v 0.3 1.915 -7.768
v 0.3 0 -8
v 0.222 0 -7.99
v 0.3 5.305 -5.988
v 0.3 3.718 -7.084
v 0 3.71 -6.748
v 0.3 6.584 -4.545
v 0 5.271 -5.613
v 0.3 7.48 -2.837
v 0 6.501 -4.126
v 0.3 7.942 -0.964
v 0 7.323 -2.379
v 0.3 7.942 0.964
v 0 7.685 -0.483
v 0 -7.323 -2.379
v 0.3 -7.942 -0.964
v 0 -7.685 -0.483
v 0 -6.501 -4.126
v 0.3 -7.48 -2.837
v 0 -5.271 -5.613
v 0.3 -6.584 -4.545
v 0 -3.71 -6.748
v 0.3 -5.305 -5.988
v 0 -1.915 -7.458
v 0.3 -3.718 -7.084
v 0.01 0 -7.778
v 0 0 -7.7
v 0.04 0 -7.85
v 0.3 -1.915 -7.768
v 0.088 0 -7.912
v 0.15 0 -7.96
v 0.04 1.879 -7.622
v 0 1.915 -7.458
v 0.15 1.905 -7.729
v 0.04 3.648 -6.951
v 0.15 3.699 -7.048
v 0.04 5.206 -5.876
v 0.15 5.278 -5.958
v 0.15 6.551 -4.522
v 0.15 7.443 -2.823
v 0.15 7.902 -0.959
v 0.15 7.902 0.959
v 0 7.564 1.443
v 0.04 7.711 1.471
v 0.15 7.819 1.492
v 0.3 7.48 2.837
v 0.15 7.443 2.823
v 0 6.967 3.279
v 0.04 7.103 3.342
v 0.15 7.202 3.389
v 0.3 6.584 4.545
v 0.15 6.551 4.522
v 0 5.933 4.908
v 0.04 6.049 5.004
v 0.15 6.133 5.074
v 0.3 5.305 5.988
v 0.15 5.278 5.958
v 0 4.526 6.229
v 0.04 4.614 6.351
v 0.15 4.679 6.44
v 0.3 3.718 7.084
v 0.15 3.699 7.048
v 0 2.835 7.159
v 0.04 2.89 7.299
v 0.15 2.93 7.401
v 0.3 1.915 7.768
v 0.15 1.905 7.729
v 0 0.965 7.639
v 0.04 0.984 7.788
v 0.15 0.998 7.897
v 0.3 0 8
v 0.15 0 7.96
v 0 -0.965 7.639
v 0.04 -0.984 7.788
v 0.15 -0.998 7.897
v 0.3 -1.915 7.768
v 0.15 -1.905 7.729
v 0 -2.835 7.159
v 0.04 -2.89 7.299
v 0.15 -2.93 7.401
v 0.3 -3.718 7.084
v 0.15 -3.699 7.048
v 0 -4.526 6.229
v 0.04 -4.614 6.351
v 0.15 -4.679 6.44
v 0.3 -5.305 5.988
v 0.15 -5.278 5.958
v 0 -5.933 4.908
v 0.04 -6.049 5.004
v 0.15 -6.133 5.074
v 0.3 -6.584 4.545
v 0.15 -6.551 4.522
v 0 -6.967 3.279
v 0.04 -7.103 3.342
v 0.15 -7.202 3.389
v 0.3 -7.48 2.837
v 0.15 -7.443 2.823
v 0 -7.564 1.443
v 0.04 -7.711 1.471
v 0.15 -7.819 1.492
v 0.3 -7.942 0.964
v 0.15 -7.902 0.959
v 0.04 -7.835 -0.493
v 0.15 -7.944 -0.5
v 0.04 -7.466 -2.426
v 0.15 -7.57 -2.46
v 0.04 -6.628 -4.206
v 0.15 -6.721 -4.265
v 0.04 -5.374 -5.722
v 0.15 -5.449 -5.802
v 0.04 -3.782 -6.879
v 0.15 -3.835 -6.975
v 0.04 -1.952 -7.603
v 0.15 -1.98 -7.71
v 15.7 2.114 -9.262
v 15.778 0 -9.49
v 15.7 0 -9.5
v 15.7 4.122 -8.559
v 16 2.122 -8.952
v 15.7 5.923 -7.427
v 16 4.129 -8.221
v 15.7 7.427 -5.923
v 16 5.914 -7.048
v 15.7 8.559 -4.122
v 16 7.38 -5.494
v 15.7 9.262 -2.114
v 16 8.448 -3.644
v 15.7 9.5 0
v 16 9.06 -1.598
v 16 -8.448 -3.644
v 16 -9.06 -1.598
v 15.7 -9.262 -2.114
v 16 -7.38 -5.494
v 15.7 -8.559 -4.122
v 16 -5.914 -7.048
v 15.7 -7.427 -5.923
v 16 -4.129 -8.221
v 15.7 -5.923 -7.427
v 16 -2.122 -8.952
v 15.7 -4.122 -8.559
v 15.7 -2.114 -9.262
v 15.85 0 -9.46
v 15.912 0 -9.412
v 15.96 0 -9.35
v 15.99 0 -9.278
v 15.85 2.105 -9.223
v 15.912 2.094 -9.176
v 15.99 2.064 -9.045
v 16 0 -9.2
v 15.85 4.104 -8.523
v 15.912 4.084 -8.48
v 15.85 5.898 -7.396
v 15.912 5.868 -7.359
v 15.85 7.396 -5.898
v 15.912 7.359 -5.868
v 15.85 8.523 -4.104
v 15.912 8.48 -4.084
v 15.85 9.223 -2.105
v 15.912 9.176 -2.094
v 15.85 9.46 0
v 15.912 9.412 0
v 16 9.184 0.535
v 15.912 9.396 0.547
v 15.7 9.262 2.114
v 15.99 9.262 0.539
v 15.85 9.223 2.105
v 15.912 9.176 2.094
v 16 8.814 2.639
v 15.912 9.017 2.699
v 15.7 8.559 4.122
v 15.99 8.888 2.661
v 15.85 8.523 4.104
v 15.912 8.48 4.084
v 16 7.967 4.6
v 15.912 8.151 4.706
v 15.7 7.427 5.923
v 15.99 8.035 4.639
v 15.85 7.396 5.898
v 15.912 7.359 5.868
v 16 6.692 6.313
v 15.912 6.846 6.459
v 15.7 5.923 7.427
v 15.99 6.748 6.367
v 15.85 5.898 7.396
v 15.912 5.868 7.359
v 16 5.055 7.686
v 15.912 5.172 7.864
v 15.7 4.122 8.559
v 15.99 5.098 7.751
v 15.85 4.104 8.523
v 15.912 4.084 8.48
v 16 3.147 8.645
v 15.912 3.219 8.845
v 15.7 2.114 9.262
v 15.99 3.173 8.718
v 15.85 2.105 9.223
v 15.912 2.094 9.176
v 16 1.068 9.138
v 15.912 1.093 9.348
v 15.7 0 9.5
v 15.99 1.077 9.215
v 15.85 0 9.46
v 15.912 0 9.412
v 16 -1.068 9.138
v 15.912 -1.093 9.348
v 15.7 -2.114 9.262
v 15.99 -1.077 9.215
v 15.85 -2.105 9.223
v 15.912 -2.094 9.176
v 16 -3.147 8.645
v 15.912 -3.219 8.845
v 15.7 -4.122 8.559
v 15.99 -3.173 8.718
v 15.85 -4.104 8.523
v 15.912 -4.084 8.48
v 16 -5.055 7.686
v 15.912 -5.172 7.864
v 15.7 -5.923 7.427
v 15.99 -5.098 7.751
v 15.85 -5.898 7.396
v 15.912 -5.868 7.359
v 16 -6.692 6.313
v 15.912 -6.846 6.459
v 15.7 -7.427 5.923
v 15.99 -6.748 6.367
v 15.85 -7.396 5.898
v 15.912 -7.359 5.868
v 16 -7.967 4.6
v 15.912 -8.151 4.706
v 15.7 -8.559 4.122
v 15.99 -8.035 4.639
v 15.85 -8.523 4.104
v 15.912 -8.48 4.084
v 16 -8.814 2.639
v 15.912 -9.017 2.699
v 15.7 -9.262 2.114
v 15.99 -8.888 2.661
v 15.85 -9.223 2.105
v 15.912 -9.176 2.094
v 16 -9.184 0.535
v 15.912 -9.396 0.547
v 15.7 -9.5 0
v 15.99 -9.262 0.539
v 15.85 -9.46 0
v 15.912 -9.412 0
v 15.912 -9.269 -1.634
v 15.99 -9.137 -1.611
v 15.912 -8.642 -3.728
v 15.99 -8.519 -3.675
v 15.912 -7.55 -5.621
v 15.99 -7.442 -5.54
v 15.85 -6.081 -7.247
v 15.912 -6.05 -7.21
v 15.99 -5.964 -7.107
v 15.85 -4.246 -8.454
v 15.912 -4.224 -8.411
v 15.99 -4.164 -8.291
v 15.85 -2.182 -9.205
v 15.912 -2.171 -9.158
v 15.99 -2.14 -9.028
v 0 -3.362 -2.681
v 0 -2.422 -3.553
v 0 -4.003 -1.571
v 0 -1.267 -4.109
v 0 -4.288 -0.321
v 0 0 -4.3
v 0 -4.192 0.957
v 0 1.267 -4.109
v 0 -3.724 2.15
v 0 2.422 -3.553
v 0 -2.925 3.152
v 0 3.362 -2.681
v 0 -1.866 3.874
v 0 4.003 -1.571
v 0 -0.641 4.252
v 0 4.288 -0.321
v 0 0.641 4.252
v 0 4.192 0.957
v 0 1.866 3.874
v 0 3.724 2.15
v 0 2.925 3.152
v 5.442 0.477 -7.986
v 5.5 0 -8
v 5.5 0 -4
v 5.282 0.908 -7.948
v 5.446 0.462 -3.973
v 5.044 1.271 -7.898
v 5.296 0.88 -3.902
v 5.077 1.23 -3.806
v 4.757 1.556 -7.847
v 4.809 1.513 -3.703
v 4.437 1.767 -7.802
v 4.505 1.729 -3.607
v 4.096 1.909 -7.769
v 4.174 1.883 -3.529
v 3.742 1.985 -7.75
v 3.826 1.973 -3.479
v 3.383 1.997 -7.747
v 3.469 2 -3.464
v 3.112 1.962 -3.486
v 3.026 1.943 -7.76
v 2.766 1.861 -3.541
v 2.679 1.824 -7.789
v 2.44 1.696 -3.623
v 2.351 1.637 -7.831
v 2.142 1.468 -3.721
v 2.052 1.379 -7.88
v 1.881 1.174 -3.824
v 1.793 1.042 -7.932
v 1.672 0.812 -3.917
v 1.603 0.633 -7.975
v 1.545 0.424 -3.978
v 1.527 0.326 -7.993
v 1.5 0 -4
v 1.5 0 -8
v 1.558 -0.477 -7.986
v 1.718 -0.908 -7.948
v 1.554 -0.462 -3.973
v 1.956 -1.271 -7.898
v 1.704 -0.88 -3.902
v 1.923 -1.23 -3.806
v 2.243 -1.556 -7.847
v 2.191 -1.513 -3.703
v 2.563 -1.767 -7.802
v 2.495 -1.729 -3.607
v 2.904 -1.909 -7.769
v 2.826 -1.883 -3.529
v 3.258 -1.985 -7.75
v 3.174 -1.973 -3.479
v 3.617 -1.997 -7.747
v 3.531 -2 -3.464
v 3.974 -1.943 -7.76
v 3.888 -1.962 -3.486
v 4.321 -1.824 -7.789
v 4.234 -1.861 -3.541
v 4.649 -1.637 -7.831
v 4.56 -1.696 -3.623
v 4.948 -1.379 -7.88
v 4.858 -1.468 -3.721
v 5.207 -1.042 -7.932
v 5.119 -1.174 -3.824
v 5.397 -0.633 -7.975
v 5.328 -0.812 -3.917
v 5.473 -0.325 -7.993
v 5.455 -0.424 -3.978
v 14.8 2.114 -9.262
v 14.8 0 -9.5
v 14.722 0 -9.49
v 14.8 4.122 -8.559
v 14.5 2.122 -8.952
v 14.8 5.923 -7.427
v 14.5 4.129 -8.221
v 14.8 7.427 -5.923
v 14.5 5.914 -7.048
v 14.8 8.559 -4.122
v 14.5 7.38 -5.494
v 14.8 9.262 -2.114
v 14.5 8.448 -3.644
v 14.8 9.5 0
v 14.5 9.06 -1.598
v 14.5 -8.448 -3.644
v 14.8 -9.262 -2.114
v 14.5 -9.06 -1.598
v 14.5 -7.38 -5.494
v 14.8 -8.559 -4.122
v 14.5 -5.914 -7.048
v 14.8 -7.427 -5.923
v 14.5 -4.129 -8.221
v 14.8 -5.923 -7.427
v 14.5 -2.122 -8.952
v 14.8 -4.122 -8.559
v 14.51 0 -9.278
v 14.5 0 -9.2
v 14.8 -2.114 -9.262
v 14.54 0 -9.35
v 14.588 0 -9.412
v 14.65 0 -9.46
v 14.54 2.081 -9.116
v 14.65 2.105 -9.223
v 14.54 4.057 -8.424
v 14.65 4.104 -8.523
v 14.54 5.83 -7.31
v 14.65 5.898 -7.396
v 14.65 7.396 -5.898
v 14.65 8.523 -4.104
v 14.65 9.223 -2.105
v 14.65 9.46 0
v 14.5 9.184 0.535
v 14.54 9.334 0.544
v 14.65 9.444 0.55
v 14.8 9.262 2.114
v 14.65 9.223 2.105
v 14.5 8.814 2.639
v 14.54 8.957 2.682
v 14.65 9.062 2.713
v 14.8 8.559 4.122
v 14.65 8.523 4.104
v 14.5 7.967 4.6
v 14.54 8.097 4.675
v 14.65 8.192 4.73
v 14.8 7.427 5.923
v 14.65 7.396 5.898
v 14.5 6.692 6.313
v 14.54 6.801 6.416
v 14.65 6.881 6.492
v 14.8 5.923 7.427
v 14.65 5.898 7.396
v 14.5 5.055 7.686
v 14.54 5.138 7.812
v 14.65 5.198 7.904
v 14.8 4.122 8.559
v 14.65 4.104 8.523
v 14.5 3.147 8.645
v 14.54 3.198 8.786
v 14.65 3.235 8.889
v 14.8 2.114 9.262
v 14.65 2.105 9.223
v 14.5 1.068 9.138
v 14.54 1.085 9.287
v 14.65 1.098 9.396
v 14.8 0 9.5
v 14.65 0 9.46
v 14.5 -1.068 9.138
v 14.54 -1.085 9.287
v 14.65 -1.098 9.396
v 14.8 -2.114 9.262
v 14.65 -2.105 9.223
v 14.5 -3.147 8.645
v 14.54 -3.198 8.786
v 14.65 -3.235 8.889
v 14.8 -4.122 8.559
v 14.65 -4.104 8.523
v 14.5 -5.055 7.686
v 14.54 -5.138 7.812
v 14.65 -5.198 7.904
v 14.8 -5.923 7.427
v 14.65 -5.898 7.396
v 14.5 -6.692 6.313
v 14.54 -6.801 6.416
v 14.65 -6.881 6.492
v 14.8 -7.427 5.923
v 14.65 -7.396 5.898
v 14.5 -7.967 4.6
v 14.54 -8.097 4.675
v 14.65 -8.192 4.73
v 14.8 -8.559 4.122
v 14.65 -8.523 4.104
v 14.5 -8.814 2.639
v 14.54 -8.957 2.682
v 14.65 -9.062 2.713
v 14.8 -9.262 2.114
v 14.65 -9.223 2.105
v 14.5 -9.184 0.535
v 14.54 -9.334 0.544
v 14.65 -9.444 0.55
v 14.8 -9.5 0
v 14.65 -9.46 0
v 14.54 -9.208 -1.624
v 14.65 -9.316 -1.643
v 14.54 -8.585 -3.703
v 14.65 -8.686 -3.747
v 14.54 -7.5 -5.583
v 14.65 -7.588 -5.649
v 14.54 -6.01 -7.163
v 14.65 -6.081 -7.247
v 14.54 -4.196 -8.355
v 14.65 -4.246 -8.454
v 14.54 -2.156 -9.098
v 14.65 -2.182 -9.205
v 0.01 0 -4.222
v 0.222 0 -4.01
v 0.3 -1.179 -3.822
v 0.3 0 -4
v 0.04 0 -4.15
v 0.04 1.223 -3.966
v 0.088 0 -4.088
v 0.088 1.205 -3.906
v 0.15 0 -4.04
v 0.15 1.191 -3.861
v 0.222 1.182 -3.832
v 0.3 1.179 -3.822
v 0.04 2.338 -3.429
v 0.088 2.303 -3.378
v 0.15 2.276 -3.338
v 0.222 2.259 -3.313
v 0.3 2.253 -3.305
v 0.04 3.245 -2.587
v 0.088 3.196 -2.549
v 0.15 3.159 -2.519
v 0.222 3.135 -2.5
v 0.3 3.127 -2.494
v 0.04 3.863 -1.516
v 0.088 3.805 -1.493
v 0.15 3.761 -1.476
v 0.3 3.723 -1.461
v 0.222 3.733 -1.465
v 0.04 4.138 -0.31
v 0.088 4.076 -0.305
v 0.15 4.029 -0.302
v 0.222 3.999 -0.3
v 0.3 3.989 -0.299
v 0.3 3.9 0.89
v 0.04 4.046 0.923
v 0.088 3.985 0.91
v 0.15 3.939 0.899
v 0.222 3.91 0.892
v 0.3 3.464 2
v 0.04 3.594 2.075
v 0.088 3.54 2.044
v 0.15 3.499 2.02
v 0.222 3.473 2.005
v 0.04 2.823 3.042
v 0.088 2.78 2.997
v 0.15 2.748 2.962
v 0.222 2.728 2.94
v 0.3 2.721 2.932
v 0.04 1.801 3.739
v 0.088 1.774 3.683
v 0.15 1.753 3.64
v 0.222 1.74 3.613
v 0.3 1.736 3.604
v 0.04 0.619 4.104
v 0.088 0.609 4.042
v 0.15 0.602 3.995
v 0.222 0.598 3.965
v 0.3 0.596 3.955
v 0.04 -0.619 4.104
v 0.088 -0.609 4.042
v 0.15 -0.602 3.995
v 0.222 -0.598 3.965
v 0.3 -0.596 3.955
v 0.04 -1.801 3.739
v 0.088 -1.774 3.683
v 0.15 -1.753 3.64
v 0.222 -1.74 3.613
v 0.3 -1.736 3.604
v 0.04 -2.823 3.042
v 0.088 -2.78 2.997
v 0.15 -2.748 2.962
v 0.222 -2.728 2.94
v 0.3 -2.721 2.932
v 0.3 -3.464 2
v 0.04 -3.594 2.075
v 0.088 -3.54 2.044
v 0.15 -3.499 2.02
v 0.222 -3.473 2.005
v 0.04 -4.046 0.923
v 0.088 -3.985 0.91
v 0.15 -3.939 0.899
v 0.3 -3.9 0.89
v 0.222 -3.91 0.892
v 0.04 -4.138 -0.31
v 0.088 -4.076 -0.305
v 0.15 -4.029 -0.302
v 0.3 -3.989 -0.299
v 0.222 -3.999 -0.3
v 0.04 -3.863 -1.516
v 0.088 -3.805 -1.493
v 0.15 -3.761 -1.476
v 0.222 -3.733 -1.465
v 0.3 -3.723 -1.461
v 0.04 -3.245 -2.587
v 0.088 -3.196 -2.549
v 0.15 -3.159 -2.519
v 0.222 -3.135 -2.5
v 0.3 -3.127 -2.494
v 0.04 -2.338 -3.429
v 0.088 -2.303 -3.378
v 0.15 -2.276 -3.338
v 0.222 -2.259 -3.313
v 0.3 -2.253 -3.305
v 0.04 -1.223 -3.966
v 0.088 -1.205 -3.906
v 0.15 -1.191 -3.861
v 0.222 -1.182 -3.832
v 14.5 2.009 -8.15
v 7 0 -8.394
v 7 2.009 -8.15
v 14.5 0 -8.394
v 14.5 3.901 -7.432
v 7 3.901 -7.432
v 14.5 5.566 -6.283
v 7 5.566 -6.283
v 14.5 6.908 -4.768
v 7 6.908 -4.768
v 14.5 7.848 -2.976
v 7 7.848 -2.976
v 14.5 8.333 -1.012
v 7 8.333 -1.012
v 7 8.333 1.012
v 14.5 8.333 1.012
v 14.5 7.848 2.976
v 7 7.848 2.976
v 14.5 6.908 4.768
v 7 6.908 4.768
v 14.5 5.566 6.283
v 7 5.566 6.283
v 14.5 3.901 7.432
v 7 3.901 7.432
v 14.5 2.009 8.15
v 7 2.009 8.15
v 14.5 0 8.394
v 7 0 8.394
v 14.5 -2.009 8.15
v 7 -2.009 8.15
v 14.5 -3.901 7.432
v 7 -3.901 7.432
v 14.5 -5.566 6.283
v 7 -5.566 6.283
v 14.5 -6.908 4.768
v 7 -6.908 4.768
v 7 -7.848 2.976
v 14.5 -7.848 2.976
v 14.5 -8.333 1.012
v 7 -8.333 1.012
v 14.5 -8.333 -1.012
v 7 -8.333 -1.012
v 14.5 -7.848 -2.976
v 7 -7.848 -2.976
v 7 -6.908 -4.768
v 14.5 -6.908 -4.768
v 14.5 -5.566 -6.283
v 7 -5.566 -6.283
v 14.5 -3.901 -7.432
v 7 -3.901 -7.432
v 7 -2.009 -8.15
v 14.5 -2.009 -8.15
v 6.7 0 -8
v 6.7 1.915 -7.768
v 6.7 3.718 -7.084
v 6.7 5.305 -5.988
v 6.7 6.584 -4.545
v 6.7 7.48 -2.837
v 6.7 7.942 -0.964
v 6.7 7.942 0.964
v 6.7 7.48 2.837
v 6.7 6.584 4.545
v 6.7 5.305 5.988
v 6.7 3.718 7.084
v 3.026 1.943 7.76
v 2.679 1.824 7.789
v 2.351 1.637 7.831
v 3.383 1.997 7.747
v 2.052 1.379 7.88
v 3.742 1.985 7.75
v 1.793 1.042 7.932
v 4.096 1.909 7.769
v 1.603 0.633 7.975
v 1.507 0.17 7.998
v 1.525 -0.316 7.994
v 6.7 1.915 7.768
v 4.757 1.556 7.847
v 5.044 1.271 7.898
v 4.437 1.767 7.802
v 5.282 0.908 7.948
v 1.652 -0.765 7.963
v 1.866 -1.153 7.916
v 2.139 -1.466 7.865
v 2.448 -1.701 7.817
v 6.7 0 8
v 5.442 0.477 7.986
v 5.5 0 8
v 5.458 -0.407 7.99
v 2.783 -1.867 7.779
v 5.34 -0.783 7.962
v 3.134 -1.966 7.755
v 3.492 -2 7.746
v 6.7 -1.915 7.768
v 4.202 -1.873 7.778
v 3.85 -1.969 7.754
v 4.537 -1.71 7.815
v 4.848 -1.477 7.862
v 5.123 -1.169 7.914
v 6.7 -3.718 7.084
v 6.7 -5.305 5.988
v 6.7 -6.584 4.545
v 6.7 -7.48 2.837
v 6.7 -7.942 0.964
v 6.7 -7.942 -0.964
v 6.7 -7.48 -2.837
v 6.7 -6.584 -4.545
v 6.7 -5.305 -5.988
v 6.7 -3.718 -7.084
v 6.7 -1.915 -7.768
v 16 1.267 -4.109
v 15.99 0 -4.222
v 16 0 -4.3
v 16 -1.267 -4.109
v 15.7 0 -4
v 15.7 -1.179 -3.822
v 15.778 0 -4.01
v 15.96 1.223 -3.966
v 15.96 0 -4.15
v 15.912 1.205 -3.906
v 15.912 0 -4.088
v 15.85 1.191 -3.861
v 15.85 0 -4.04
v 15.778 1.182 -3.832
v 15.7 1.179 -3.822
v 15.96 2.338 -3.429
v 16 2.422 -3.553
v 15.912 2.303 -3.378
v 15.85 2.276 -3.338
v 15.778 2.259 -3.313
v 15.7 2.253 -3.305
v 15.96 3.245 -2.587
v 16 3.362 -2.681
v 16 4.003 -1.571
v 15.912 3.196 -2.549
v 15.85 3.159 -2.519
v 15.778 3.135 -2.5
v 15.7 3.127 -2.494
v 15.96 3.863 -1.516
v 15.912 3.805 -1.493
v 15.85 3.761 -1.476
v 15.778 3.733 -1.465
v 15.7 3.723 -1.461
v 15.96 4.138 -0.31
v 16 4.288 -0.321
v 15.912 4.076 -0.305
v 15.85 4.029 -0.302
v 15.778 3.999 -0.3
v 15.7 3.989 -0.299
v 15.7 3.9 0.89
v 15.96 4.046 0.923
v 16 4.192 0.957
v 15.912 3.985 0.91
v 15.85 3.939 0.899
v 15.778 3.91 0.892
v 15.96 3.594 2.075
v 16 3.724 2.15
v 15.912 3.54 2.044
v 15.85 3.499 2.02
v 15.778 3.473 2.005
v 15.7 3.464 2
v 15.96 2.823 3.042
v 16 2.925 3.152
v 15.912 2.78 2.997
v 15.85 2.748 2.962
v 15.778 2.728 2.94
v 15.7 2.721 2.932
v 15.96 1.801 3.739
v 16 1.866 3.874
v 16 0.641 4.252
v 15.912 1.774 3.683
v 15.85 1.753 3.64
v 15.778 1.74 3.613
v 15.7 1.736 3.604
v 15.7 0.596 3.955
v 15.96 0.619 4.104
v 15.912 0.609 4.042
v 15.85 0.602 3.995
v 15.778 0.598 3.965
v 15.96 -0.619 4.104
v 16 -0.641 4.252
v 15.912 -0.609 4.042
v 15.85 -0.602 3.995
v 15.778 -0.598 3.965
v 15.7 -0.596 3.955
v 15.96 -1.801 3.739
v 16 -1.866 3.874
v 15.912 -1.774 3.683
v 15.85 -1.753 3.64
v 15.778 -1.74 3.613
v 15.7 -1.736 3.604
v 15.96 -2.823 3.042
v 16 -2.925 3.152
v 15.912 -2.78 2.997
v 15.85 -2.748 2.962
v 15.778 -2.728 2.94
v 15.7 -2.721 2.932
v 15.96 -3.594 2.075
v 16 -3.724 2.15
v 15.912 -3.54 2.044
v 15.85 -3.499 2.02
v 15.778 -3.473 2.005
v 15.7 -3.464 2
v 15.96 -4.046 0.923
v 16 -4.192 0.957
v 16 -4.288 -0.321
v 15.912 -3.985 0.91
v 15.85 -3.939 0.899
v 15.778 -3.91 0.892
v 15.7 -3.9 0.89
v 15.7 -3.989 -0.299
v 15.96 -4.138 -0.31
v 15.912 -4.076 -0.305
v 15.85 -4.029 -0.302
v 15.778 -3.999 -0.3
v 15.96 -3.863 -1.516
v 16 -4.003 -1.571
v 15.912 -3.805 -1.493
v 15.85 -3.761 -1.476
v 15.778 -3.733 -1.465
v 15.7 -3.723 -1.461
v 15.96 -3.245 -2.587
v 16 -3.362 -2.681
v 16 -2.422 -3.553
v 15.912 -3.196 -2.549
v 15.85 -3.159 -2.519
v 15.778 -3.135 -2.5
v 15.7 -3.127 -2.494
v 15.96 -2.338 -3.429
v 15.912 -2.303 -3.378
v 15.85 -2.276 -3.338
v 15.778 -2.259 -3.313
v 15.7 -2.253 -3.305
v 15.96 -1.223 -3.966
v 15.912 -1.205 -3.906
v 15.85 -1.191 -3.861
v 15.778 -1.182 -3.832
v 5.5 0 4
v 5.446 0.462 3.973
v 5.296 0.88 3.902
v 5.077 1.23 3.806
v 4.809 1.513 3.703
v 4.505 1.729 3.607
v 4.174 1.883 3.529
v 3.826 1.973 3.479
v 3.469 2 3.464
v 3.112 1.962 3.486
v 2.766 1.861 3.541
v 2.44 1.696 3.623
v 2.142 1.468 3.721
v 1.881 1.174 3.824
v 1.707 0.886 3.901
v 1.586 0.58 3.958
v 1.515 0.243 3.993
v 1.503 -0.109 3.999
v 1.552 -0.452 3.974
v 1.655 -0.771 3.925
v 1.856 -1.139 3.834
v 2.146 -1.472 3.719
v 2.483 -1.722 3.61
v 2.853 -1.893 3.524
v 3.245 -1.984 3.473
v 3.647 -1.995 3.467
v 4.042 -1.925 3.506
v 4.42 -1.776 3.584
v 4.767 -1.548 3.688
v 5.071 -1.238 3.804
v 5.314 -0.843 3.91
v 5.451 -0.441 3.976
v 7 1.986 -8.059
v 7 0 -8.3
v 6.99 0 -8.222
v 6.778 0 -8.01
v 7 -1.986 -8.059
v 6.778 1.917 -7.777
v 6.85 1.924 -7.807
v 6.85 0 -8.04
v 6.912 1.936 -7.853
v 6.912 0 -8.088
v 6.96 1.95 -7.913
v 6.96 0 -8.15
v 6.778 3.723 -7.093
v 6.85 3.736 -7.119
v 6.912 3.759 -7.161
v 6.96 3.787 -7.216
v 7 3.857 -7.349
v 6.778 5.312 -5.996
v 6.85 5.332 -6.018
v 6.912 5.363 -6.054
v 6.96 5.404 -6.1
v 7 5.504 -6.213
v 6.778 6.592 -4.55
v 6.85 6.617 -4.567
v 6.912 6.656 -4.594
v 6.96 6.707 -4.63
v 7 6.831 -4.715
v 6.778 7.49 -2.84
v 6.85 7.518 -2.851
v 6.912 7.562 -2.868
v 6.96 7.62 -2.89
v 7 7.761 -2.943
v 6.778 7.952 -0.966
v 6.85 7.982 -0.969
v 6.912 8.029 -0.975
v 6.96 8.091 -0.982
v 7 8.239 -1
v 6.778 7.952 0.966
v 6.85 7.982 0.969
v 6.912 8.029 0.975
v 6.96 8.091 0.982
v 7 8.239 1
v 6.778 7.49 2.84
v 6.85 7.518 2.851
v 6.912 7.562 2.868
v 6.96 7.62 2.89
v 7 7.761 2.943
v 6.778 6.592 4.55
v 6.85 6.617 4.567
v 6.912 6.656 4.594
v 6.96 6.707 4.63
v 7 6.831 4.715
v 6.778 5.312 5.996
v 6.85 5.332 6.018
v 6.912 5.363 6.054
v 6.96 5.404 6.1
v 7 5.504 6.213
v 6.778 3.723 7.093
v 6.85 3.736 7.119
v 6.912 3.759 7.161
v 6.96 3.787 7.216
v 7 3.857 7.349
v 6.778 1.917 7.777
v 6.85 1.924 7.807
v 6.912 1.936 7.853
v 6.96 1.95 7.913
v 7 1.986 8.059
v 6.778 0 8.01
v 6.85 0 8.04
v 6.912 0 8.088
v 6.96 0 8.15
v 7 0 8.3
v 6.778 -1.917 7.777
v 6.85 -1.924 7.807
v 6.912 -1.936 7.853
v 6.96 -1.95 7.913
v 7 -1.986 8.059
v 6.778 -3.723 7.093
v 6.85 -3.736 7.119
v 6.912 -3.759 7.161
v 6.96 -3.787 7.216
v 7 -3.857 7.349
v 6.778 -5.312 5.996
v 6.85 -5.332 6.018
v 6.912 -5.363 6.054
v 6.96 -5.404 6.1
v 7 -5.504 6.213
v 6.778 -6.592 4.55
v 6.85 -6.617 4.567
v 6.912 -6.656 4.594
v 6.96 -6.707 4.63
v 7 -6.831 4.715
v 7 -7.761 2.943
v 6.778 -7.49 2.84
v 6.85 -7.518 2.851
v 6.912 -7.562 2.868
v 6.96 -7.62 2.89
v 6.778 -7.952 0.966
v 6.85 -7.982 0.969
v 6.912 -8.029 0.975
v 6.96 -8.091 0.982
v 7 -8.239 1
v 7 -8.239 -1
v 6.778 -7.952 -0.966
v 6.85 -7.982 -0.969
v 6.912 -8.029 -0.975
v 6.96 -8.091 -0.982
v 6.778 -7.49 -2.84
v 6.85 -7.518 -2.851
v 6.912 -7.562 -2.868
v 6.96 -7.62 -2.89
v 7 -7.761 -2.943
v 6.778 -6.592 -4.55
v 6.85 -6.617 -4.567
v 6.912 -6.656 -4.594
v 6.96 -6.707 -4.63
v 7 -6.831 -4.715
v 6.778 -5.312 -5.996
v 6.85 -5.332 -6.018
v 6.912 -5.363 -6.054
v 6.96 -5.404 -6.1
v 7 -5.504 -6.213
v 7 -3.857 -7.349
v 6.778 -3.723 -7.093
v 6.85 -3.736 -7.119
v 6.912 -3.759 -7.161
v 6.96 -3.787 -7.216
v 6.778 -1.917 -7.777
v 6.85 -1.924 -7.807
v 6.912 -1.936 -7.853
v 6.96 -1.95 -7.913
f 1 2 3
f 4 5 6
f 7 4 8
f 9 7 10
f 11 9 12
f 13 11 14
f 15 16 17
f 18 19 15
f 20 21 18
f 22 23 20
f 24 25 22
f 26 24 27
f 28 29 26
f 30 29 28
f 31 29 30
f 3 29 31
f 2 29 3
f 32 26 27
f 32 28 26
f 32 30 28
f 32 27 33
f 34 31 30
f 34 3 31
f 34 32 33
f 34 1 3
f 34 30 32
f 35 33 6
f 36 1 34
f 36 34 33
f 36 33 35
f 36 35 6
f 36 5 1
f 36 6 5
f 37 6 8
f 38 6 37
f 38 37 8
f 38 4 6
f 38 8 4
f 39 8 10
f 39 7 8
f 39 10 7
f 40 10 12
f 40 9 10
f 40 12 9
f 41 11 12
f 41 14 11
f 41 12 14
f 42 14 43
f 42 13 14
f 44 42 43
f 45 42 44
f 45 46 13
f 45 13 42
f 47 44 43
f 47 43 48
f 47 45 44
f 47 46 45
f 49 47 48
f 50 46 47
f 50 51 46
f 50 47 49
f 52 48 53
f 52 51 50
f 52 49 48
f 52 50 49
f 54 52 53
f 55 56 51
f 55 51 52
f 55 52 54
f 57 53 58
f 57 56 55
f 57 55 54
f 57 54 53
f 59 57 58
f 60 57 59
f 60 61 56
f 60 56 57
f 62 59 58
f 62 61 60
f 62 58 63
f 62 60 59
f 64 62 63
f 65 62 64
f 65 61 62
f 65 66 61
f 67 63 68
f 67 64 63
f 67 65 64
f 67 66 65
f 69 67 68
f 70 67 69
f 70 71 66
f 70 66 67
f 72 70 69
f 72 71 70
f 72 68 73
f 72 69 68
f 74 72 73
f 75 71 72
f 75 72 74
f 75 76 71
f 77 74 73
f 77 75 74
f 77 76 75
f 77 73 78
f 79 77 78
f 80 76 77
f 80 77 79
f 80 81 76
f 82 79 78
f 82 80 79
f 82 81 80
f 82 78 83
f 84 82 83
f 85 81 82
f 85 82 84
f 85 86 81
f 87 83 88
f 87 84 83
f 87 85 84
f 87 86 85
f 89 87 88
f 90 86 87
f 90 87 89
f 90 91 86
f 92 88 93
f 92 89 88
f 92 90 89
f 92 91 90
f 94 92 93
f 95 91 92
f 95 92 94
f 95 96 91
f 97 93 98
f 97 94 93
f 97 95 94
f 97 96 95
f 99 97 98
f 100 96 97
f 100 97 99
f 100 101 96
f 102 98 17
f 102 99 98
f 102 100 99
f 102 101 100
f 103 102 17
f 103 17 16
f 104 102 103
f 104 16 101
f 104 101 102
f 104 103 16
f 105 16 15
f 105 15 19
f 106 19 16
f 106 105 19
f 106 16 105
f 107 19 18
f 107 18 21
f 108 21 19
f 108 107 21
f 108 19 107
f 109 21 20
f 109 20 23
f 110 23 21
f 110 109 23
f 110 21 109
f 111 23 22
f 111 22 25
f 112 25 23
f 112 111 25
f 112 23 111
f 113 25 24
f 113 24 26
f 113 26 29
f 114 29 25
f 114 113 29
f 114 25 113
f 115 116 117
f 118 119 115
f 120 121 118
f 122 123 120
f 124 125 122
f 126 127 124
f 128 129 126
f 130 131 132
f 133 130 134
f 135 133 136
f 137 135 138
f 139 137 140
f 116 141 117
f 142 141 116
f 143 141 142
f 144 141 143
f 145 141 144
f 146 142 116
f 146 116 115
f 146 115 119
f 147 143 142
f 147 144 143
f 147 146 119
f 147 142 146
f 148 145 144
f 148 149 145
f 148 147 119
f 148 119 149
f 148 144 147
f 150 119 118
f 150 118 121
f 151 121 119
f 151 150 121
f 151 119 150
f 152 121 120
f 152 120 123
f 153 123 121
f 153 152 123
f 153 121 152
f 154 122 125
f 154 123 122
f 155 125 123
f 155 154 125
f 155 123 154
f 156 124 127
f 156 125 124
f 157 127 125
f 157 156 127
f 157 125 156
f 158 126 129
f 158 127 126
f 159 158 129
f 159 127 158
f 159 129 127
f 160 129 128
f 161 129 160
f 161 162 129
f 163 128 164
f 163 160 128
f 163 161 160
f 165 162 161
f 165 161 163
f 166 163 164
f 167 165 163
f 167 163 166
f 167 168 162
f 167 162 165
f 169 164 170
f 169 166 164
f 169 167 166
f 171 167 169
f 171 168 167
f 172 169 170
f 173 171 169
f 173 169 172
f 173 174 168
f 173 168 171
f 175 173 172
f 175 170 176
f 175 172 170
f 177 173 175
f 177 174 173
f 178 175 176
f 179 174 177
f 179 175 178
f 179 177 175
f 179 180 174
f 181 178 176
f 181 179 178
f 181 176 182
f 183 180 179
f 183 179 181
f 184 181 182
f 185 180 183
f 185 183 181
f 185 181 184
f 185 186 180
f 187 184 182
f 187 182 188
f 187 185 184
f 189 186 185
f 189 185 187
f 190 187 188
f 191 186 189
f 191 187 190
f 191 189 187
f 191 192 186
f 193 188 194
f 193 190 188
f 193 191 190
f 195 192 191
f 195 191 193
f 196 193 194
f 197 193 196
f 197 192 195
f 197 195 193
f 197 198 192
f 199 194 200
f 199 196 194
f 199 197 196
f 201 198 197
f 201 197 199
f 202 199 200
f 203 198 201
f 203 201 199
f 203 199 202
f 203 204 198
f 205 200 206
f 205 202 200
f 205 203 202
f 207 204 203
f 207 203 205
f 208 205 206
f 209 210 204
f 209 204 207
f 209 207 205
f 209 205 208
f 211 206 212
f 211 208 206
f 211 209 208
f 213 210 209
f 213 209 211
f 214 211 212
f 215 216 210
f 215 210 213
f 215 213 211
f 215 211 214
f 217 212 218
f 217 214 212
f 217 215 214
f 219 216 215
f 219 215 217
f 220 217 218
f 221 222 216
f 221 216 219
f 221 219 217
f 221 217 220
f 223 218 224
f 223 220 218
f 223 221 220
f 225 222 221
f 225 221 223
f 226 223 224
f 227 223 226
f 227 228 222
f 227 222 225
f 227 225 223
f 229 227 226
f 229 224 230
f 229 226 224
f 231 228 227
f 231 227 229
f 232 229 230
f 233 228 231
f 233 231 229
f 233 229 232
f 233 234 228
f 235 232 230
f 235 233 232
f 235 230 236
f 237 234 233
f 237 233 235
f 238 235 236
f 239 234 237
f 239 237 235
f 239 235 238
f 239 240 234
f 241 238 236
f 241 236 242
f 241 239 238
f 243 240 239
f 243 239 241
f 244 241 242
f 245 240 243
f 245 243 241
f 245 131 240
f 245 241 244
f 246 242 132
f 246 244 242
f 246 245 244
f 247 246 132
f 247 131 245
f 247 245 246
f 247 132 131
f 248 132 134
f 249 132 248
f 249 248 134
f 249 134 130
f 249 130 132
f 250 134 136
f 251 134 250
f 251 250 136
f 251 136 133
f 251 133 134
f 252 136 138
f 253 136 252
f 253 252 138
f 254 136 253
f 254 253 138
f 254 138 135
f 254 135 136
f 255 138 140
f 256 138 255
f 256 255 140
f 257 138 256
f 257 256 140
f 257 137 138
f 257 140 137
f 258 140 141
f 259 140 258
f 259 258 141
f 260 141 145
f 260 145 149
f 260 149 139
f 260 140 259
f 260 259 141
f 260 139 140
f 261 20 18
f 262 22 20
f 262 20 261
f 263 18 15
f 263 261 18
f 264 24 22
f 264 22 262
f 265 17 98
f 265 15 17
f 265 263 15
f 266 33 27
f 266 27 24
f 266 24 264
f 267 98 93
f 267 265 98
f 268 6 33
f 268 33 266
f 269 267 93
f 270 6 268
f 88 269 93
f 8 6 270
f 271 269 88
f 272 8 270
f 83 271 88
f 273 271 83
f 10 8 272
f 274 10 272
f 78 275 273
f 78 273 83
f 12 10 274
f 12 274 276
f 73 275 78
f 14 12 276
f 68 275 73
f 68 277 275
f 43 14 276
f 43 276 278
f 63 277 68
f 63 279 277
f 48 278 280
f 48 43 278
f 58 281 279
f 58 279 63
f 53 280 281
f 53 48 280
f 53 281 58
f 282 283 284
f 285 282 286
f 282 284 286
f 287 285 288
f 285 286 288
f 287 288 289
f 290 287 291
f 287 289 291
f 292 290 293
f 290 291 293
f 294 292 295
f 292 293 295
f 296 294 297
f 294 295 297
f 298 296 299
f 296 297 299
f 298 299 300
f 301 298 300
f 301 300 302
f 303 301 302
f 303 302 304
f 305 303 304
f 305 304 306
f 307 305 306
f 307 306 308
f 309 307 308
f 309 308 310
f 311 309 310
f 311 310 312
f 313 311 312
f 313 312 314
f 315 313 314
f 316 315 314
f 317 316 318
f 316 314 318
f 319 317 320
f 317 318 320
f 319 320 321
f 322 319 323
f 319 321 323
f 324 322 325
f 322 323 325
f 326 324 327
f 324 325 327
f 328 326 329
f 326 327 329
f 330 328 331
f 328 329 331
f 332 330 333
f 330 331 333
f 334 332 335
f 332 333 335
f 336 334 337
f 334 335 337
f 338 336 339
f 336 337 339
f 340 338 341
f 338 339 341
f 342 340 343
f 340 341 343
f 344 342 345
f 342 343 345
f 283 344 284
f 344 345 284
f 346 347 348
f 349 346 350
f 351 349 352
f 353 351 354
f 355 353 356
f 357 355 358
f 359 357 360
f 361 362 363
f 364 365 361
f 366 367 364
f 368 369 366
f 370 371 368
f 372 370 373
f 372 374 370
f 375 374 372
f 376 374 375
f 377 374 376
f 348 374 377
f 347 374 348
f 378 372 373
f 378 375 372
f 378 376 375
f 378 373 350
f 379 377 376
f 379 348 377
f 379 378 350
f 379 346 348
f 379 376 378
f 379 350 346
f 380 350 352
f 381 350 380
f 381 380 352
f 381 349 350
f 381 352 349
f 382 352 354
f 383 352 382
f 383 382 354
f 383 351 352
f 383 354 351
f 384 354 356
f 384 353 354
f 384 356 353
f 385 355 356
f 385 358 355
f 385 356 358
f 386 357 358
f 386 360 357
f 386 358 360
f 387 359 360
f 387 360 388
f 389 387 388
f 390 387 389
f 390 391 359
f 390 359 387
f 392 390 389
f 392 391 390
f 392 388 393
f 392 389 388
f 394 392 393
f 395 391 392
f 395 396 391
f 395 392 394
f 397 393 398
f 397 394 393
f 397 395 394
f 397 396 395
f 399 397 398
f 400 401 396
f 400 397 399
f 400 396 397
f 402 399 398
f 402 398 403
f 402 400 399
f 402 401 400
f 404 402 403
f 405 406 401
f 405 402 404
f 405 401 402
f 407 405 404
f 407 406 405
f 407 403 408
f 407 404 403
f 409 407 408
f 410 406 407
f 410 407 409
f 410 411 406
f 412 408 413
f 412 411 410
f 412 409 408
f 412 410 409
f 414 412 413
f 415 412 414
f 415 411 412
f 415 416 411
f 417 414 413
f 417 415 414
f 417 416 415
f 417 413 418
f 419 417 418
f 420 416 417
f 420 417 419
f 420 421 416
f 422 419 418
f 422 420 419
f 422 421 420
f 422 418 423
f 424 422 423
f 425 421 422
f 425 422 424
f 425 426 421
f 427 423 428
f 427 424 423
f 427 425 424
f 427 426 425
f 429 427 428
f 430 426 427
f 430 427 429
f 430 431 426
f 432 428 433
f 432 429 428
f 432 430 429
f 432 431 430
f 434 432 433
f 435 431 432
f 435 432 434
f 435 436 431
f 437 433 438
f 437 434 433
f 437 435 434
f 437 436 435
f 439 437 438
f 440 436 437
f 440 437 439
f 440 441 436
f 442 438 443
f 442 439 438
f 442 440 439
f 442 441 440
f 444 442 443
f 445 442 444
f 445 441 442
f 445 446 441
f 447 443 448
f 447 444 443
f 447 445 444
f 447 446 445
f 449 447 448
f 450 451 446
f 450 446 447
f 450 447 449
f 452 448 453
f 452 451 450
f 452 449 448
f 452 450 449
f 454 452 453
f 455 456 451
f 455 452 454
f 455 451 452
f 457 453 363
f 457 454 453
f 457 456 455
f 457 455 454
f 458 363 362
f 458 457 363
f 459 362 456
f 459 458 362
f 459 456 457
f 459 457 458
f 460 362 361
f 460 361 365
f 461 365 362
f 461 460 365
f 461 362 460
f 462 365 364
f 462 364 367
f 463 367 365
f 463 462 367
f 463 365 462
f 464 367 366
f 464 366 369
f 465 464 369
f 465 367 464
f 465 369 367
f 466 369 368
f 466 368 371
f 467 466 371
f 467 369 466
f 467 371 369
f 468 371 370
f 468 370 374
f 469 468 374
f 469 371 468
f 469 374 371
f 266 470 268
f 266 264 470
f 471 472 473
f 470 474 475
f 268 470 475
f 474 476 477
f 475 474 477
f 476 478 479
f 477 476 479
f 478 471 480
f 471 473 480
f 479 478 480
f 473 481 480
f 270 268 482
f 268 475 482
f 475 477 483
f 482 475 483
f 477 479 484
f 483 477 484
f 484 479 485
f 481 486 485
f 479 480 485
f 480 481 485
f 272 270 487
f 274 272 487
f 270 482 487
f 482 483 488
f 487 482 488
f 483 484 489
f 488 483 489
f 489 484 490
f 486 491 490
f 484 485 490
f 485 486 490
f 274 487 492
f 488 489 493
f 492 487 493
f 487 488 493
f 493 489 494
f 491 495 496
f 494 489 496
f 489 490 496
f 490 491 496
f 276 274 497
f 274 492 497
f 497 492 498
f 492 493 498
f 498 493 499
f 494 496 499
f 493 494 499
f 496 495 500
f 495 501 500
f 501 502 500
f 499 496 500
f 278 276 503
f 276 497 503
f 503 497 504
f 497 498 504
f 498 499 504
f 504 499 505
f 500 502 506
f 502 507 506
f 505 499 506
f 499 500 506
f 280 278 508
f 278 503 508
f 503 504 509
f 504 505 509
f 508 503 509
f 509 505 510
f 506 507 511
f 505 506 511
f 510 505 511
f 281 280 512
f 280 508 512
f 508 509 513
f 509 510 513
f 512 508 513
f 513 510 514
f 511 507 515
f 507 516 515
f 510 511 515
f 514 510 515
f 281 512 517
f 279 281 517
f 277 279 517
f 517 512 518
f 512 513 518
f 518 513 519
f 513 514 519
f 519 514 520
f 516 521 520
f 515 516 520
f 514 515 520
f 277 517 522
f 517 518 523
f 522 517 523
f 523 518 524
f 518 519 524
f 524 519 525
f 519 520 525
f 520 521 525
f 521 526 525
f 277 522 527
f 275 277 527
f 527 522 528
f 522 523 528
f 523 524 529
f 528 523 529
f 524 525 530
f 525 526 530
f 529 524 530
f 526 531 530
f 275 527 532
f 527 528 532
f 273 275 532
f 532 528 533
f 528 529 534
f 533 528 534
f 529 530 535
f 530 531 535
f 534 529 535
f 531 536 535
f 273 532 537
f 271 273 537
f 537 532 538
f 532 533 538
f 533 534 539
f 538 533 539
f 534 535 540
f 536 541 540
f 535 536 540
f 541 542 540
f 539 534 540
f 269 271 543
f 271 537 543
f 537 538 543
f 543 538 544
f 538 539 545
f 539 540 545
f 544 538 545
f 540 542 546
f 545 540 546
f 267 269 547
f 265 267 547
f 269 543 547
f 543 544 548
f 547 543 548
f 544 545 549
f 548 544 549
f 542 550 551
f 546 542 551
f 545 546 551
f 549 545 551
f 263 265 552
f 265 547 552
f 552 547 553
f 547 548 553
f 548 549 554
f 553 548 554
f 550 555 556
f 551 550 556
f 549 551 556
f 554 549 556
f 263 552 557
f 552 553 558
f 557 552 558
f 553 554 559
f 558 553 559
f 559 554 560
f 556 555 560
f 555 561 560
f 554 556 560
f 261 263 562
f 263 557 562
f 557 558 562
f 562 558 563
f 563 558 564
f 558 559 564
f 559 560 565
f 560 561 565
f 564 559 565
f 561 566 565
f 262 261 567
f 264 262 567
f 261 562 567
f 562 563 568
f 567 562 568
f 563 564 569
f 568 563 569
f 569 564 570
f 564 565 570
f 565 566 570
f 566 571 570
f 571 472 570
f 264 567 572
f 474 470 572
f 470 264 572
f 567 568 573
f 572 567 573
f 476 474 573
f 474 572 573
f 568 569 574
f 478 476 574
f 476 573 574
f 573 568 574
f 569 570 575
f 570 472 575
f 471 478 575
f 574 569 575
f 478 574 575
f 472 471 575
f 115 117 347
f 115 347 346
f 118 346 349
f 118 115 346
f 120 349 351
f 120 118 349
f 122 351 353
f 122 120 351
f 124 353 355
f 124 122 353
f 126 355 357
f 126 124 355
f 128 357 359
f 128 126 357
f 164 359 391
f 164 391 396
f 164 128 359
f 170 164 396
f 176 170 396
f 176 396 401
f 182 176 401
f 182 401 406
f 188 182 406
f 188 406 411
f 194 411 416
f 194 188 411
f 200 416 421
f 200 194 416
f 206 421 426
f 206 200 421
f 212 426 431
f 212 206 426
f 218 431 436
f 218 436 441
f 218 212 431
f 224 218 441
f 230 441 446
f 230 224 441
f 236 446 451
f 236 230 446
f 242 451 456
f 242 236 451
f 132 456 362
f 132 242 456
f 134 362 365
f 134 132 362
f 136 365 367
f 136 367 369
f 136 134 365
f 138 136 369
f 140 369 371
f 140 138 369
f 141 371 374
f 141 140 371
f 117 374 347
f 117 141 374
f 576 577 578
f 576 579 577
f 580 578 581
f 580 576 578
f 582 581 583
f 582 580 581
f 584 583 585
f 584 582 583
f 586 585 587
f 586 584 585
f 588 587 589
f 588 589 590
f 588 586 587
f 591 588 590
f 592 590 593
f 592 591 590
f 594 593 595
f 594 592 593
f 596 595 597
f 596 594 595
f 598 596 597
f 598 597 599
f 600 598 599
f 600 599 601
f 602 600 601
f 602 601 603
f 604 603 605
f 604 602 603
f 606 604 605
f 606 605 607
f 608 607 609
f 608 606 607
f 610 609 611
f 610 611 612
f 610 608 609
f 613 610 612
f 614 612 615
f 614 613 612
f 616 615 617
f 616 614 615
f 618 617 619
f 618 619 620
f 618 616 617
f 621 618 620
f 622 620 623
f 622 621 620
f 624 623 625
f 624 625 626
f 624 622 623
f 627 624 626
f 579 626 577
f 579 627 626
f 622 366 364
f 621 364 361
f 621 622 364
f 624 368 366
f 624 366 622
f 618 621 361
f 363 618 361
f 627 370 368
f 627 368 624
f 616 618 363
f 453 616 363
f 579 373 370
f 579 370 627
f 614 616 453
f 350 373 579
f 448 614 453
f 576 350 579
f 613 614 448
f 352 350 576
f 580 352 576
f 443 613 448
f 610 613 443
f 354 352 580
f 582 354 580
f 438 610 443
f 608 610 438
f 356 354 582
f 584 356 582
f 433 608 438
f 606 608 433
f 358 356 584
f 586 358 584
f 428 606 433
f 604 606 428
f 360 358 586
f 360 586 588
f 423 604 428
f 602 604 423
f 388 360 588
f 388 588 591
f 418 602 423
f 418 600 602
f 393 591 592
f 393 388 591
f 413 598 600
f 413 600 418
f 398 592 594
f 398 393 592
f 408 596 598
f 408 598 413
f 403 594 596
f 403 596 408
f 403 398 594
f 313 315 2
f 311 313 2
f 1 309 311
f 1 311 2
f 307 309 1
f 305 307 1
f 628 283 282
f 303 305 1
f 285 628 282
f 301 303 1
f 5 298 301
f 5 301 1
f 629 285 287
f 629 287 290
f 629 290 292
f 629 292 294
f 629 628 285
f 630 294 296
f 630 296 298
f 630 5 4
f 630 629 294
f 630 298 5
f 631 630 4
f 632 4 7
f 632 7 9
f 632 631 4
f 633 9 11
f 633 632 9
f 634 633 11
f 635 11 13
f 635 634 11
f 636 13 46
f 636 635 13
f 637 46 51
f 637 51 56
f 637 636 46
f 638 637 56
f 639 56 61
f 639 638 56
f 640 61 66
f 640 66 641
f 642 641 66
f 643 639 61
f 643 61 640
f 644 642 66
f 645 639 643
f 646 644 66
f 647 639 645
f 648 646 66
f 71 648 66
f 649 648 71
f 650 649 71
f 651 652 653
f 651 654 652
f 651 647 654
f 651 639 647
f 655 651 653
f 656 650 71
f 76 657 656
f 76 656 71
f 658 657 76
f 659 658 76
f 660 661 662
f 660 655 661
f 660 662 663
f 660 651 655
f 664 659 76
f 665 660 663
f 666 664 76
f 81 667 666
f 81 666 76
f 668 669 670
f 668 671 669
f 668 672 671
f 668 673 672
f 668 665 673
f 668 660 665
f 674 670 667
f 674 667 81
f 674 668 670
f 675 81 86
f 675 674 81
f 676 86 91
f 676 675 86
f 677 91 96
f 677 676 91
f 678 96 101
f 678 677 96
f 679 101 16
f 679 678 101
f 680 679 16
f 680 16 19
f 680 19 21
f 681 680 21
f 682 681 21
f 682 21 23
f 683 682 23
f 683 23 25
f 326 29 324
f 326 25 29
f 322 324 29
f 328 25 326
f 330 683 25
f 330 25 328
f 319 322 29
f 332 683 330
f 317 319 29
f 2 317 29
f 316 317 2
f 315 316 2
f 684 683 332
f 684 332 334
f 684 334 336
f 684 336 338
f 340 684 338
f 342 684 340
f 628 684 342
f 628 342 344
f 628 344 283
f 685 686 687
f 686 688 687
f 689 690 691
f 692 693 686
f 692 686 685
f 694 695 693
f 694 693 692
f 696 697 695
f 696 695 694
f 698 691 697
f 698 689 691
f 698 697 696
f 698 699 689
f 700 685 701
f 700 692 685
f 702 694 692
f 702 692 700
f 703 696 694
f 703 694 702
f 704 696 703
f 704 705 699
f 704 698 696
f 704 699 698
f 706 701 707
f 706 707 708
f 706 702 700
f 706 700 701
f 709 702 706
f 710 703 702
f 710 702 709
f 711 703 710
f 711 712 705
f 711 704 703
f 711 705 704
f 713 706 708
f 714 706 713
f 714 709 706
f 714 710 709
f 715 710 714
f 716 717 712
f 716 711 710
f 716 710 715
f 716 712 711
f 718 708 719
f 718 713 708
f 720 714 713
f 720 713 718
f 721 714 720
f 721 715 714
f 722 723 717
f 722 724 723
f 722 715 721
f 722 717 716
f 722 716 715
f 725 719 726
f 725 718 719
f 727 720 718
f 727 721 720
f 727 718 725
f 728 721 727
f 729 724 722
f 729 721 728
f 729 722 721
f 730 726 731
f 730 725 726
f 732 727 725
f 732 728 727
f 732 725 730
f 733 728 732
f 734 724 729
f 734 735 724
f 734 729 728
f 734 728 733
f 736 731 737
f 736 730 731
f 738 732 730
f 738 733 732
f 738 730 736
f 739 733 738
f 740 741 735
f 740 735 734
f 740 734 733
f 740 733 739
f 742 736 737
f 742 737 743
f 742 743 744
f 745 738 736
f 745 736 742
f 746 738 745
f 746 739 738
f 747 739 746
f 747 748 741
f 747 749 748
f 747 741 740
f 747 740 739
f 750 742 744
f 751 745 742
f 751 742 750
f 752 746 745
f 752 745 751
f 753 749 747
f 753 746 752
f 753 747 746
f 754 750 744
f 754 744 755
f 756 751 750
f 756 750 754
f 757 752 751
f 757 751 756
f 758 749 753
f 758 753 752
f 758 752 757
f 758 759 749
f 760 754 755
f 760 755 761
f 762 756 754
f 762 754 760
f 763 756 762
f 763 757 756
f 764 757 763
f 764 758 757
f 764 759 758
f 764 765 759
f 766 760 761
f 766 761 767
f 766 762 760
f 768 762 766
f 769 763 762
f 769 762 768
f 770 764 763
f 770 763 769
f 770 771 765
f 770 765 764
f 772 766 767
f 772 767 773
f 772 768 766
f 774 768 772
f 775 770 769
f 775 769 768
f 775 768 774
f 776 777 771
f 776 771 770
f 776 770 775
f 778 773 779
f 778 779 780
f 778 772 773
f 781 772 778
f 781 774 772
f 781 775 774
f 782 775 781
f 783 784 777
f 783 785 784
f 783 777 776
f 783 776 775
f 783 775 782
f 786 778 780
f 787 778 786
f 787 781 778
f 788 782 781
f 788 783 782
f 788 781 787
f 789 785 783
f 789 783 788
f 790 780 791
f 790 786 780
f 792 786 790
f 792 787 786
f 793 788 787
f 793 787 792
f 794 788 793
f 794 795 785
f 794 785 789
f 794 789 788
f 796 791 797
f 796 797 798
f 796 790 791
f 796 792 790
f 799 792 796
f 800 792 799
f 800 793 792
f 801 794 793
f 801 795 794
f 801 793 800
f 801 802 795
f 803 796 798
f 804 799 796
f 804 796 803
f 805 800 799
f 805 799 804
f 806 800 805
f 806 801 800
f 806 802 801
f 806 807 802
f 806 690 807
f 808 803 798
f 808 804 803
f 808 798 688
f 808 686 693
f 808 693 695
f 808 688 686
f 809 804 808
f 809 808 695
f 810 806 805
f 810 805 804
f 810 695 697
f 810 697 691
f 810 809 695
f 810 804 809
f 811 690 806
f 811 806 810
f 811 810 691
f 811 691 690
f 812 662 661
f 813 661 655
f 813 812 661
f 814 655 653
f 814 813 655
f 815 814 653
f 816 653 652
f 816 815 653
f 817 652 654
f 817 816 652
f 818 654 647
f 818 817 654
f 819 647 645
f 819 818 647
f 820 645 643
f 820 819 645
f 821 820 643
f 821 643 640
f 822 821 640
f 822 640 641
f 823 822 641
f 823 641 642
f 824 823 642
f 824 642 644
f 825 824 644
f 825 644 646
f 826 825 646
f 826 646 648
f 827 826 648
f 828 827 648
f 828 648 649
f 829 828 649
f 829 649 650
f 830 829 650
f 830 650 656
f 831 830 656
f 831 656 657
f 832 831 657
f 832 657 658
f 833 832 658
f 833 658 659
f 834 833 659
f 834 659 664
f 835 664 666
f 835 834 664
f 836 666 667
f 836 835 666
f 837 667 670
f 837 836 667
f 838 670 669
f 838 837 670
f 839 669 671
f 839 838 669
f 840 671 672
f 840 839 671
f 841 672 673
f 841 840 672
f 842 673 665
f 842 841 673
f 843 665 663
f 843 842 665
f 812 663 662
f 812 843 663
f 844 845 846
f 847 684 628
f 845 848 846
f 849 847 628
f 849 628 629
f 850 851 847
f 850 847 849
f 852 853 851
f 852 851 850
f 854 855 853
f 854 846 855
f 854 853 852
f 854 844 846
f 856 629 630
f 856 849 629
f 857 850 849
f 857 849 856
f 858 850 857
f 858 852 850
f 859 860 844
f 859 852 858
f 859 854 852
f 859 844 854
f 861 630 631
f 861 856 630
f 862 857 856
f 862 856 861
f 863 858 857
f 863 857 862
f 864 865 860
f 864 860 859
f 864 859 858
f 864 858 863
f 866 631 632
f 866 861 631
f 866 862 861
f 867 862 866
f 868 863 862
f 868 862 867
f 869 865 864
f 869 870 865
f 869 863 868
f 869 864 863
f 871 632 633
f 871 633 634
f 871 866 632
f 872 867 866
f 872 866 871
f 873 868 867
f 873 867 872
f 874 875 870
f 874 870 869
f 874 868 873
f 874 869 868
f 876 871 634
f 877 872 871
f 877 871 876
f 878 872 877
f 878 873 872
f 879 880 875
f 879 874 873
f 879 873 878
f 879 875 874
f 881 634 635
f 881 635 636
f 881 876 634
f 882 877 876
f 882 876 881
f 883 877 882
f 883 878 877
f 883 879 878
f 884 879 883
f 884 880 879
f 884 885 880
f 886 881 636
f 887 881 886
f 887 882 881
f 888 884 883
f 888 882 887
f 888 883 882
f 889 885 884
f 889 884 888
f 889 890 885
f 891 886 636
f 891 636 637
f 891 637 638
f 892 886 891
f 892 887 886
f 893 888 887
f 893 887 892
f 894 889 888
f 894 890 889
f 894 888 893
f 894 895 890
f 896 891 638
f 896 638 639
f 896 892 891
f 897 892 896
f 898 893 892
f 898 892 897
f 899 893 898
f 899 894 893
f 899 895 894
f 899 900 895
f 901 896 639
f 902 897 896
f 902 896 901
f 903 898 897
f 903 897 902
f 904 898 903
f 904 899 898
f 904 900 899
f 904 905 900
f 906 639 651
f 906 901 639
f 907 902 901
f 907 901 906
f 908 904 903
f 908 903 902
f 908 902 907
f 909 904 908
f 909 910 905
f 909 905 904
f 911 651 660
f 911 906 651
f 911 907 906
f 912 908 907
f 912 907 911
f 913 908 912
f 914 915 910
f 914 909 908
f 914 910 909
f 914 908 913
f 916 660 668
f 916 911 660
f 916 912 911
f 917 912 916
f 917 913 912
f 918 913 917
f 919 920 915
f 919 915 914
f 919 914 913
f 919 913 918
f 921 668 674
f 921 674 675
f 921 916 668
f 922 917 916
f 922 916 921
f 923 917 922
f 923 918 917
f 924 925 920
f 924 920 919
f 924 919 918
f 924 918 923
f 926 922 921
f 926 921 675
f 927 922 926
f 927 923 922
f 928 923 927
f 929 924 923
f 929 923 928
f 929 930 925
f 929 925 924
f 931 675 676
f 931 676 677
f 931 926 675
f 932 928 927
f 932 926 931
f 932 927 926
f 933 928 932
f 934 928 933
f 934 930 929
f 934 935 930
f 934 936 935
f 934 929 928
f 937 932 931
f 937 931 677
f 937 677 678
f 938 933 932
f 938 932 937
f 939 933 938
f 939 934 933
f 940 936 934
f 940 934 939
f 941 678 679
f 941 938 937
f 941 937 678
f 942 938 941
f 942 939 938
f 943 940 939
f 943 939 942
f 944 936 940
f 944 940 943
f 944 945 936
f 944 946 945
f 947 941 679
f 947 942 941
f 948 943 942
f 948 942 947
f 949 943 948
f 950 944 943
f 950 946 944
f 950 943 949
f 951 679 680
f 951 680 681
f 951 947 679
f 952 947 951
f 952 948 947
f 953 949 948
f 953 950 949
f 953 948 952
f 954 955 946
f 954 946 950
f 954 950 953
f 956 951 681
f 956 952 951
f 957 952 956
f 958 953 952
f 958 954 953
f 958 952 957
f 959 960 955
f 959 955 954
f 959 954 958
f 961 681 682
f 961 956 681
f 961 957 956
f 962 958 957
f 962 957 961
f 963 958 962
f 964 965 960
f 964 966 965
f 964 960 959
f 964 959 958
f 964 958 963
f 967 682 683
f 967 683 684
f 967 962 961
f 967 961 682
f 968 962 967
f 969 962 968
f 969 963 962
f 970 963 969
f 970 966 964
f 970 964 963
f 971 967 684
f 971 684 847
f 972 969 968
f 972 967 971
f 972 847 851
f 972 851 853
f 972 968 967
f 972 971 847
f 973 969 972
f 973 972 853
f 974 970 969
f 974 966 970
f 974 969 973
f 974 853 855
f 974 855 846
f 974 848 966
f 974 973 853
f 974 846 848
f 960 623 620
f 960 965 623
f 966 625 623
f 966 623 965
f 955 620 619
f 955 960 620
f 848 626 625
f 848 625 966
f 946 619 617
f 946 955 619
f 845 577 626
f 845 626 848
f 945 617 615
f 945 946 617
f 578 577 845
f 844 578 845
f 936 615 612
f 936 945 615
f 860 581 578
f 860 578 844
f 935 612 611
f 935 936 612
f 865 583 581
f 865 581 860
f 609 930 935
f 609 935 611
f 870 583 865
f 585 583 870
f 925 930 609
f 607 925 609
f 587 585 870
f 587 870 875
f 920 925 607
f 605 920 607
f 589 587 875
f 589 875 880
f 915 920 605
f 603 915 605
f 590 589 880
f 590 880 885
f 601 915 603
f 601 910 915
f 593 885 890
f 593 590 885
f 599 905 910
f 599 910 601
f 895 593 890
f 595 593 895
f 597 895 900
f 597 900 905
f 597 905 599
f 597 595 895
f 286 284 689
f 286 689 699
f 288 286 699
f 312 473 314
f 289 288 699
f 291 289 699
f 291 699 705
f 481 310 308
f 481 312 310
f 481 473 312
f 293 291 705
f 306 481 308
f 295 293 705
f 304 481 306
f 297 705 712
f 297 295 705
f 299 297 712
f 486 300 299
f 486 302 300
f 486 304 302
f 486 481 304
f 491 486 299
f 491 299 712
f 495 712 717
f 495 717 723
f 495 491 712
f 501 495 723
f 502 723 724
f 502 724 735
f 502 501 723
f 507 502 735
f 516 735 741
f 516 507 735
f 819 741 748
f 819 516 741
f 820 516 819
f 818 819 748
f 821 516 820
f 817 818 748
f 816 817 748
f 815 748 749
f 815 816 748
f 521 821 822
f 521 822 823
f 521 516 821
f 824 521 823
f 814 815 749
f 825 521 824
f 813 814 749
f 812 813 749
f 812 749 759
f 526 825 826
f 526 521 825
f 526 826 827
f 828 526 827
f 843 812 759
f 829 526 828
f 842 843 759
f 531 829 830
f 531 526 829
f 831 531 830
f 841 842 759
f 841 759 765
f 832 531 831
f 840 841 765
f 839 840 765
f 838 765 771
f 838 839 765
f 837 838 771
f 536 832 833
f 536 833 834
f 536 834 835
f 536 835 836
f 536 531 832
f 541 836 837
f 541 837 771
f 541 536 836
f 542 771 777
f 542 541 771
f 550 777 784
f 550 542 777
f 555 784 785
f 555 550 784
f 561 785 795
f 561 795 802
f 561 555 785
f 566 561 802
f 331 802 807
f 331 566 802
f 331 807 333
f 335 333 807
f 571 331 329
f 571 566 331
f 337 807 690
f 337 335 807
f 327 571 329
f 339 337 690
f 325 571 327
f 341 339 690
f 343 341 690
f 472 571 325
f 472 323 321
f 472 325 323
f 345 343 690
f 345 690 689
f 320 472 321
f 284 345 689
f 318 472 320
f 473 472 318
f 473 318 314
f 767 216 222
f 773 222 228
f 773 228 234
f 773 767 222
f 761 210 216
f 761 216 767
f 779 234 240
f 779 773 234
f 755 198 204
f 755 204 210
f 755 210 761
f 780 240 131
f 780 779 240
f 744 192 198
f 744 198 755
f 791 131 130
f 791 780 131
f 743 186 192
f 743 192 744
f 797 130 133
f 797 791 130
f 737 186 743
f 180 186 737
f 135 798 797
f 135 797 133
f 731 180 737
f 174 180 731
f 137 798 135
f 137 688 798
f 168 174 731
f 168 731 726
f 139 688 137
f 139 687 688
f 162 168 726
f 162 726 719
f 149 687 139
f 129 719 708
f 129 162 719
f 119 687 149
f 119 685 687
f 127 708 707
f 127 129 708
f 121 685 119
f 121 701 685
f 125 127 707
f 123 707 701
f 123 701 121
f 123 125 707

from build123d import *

# Parameters (mm, degrees)
FILLET1_R               = 0.3
SKETCH2_R               = 2
CUT_EXTRUDE1_DEPTH      = 10.5
CUT_EXTRUDE1_DEPTH_BACK = 10.5


with BuildPart() as part:
    # Sketch1 → Revolve1 (revolve)
    with BuildSketch(Plane(origin=(0, 0, 0), x_dir=(1, 0, 0), z_dir=(0, 1, 0))):
        Polygon((0, 4), (0, 8), (7, 8), (7, 8.39378315), (14.5, 8.39378315), (14.5, 9.5), (16, 9.5), (16, 4), align=None)
    revolve(axis=Axis((0, 0, 0), (1, 0, 0)))

    # Fillet1
    fillet1_edges = [part.edges().sort_by_distance(p)[0] for p in [
        (0, 0, 4),
        (16, 0, 4),
        (16, 0, 9.5),
        (14.5, 0, 9.5),
        (7, 0, 8),
        (0, 0, 8),
    ]]
    fillet(fillet1_edges, radius=FILLET1_R)

    # Sketch2 → Cut-Extrude1 (cut, two sides)
    with BuildSketch(Plane.XY) as cut_extrude1_sk:
        with Locations((3.5, 0)):
            Circle(SKETCH2_R)
    extrude(amount=CUT_EXTRUDE1_DEPTH, mode=Mode.SUBTRACT)
    extrude(cut_extrude1_sk.sketch, amount=-CUT_EXTRUDE1_DEPTH_BACK, mode=Mode.SUBTRACT)


solid = part.part
